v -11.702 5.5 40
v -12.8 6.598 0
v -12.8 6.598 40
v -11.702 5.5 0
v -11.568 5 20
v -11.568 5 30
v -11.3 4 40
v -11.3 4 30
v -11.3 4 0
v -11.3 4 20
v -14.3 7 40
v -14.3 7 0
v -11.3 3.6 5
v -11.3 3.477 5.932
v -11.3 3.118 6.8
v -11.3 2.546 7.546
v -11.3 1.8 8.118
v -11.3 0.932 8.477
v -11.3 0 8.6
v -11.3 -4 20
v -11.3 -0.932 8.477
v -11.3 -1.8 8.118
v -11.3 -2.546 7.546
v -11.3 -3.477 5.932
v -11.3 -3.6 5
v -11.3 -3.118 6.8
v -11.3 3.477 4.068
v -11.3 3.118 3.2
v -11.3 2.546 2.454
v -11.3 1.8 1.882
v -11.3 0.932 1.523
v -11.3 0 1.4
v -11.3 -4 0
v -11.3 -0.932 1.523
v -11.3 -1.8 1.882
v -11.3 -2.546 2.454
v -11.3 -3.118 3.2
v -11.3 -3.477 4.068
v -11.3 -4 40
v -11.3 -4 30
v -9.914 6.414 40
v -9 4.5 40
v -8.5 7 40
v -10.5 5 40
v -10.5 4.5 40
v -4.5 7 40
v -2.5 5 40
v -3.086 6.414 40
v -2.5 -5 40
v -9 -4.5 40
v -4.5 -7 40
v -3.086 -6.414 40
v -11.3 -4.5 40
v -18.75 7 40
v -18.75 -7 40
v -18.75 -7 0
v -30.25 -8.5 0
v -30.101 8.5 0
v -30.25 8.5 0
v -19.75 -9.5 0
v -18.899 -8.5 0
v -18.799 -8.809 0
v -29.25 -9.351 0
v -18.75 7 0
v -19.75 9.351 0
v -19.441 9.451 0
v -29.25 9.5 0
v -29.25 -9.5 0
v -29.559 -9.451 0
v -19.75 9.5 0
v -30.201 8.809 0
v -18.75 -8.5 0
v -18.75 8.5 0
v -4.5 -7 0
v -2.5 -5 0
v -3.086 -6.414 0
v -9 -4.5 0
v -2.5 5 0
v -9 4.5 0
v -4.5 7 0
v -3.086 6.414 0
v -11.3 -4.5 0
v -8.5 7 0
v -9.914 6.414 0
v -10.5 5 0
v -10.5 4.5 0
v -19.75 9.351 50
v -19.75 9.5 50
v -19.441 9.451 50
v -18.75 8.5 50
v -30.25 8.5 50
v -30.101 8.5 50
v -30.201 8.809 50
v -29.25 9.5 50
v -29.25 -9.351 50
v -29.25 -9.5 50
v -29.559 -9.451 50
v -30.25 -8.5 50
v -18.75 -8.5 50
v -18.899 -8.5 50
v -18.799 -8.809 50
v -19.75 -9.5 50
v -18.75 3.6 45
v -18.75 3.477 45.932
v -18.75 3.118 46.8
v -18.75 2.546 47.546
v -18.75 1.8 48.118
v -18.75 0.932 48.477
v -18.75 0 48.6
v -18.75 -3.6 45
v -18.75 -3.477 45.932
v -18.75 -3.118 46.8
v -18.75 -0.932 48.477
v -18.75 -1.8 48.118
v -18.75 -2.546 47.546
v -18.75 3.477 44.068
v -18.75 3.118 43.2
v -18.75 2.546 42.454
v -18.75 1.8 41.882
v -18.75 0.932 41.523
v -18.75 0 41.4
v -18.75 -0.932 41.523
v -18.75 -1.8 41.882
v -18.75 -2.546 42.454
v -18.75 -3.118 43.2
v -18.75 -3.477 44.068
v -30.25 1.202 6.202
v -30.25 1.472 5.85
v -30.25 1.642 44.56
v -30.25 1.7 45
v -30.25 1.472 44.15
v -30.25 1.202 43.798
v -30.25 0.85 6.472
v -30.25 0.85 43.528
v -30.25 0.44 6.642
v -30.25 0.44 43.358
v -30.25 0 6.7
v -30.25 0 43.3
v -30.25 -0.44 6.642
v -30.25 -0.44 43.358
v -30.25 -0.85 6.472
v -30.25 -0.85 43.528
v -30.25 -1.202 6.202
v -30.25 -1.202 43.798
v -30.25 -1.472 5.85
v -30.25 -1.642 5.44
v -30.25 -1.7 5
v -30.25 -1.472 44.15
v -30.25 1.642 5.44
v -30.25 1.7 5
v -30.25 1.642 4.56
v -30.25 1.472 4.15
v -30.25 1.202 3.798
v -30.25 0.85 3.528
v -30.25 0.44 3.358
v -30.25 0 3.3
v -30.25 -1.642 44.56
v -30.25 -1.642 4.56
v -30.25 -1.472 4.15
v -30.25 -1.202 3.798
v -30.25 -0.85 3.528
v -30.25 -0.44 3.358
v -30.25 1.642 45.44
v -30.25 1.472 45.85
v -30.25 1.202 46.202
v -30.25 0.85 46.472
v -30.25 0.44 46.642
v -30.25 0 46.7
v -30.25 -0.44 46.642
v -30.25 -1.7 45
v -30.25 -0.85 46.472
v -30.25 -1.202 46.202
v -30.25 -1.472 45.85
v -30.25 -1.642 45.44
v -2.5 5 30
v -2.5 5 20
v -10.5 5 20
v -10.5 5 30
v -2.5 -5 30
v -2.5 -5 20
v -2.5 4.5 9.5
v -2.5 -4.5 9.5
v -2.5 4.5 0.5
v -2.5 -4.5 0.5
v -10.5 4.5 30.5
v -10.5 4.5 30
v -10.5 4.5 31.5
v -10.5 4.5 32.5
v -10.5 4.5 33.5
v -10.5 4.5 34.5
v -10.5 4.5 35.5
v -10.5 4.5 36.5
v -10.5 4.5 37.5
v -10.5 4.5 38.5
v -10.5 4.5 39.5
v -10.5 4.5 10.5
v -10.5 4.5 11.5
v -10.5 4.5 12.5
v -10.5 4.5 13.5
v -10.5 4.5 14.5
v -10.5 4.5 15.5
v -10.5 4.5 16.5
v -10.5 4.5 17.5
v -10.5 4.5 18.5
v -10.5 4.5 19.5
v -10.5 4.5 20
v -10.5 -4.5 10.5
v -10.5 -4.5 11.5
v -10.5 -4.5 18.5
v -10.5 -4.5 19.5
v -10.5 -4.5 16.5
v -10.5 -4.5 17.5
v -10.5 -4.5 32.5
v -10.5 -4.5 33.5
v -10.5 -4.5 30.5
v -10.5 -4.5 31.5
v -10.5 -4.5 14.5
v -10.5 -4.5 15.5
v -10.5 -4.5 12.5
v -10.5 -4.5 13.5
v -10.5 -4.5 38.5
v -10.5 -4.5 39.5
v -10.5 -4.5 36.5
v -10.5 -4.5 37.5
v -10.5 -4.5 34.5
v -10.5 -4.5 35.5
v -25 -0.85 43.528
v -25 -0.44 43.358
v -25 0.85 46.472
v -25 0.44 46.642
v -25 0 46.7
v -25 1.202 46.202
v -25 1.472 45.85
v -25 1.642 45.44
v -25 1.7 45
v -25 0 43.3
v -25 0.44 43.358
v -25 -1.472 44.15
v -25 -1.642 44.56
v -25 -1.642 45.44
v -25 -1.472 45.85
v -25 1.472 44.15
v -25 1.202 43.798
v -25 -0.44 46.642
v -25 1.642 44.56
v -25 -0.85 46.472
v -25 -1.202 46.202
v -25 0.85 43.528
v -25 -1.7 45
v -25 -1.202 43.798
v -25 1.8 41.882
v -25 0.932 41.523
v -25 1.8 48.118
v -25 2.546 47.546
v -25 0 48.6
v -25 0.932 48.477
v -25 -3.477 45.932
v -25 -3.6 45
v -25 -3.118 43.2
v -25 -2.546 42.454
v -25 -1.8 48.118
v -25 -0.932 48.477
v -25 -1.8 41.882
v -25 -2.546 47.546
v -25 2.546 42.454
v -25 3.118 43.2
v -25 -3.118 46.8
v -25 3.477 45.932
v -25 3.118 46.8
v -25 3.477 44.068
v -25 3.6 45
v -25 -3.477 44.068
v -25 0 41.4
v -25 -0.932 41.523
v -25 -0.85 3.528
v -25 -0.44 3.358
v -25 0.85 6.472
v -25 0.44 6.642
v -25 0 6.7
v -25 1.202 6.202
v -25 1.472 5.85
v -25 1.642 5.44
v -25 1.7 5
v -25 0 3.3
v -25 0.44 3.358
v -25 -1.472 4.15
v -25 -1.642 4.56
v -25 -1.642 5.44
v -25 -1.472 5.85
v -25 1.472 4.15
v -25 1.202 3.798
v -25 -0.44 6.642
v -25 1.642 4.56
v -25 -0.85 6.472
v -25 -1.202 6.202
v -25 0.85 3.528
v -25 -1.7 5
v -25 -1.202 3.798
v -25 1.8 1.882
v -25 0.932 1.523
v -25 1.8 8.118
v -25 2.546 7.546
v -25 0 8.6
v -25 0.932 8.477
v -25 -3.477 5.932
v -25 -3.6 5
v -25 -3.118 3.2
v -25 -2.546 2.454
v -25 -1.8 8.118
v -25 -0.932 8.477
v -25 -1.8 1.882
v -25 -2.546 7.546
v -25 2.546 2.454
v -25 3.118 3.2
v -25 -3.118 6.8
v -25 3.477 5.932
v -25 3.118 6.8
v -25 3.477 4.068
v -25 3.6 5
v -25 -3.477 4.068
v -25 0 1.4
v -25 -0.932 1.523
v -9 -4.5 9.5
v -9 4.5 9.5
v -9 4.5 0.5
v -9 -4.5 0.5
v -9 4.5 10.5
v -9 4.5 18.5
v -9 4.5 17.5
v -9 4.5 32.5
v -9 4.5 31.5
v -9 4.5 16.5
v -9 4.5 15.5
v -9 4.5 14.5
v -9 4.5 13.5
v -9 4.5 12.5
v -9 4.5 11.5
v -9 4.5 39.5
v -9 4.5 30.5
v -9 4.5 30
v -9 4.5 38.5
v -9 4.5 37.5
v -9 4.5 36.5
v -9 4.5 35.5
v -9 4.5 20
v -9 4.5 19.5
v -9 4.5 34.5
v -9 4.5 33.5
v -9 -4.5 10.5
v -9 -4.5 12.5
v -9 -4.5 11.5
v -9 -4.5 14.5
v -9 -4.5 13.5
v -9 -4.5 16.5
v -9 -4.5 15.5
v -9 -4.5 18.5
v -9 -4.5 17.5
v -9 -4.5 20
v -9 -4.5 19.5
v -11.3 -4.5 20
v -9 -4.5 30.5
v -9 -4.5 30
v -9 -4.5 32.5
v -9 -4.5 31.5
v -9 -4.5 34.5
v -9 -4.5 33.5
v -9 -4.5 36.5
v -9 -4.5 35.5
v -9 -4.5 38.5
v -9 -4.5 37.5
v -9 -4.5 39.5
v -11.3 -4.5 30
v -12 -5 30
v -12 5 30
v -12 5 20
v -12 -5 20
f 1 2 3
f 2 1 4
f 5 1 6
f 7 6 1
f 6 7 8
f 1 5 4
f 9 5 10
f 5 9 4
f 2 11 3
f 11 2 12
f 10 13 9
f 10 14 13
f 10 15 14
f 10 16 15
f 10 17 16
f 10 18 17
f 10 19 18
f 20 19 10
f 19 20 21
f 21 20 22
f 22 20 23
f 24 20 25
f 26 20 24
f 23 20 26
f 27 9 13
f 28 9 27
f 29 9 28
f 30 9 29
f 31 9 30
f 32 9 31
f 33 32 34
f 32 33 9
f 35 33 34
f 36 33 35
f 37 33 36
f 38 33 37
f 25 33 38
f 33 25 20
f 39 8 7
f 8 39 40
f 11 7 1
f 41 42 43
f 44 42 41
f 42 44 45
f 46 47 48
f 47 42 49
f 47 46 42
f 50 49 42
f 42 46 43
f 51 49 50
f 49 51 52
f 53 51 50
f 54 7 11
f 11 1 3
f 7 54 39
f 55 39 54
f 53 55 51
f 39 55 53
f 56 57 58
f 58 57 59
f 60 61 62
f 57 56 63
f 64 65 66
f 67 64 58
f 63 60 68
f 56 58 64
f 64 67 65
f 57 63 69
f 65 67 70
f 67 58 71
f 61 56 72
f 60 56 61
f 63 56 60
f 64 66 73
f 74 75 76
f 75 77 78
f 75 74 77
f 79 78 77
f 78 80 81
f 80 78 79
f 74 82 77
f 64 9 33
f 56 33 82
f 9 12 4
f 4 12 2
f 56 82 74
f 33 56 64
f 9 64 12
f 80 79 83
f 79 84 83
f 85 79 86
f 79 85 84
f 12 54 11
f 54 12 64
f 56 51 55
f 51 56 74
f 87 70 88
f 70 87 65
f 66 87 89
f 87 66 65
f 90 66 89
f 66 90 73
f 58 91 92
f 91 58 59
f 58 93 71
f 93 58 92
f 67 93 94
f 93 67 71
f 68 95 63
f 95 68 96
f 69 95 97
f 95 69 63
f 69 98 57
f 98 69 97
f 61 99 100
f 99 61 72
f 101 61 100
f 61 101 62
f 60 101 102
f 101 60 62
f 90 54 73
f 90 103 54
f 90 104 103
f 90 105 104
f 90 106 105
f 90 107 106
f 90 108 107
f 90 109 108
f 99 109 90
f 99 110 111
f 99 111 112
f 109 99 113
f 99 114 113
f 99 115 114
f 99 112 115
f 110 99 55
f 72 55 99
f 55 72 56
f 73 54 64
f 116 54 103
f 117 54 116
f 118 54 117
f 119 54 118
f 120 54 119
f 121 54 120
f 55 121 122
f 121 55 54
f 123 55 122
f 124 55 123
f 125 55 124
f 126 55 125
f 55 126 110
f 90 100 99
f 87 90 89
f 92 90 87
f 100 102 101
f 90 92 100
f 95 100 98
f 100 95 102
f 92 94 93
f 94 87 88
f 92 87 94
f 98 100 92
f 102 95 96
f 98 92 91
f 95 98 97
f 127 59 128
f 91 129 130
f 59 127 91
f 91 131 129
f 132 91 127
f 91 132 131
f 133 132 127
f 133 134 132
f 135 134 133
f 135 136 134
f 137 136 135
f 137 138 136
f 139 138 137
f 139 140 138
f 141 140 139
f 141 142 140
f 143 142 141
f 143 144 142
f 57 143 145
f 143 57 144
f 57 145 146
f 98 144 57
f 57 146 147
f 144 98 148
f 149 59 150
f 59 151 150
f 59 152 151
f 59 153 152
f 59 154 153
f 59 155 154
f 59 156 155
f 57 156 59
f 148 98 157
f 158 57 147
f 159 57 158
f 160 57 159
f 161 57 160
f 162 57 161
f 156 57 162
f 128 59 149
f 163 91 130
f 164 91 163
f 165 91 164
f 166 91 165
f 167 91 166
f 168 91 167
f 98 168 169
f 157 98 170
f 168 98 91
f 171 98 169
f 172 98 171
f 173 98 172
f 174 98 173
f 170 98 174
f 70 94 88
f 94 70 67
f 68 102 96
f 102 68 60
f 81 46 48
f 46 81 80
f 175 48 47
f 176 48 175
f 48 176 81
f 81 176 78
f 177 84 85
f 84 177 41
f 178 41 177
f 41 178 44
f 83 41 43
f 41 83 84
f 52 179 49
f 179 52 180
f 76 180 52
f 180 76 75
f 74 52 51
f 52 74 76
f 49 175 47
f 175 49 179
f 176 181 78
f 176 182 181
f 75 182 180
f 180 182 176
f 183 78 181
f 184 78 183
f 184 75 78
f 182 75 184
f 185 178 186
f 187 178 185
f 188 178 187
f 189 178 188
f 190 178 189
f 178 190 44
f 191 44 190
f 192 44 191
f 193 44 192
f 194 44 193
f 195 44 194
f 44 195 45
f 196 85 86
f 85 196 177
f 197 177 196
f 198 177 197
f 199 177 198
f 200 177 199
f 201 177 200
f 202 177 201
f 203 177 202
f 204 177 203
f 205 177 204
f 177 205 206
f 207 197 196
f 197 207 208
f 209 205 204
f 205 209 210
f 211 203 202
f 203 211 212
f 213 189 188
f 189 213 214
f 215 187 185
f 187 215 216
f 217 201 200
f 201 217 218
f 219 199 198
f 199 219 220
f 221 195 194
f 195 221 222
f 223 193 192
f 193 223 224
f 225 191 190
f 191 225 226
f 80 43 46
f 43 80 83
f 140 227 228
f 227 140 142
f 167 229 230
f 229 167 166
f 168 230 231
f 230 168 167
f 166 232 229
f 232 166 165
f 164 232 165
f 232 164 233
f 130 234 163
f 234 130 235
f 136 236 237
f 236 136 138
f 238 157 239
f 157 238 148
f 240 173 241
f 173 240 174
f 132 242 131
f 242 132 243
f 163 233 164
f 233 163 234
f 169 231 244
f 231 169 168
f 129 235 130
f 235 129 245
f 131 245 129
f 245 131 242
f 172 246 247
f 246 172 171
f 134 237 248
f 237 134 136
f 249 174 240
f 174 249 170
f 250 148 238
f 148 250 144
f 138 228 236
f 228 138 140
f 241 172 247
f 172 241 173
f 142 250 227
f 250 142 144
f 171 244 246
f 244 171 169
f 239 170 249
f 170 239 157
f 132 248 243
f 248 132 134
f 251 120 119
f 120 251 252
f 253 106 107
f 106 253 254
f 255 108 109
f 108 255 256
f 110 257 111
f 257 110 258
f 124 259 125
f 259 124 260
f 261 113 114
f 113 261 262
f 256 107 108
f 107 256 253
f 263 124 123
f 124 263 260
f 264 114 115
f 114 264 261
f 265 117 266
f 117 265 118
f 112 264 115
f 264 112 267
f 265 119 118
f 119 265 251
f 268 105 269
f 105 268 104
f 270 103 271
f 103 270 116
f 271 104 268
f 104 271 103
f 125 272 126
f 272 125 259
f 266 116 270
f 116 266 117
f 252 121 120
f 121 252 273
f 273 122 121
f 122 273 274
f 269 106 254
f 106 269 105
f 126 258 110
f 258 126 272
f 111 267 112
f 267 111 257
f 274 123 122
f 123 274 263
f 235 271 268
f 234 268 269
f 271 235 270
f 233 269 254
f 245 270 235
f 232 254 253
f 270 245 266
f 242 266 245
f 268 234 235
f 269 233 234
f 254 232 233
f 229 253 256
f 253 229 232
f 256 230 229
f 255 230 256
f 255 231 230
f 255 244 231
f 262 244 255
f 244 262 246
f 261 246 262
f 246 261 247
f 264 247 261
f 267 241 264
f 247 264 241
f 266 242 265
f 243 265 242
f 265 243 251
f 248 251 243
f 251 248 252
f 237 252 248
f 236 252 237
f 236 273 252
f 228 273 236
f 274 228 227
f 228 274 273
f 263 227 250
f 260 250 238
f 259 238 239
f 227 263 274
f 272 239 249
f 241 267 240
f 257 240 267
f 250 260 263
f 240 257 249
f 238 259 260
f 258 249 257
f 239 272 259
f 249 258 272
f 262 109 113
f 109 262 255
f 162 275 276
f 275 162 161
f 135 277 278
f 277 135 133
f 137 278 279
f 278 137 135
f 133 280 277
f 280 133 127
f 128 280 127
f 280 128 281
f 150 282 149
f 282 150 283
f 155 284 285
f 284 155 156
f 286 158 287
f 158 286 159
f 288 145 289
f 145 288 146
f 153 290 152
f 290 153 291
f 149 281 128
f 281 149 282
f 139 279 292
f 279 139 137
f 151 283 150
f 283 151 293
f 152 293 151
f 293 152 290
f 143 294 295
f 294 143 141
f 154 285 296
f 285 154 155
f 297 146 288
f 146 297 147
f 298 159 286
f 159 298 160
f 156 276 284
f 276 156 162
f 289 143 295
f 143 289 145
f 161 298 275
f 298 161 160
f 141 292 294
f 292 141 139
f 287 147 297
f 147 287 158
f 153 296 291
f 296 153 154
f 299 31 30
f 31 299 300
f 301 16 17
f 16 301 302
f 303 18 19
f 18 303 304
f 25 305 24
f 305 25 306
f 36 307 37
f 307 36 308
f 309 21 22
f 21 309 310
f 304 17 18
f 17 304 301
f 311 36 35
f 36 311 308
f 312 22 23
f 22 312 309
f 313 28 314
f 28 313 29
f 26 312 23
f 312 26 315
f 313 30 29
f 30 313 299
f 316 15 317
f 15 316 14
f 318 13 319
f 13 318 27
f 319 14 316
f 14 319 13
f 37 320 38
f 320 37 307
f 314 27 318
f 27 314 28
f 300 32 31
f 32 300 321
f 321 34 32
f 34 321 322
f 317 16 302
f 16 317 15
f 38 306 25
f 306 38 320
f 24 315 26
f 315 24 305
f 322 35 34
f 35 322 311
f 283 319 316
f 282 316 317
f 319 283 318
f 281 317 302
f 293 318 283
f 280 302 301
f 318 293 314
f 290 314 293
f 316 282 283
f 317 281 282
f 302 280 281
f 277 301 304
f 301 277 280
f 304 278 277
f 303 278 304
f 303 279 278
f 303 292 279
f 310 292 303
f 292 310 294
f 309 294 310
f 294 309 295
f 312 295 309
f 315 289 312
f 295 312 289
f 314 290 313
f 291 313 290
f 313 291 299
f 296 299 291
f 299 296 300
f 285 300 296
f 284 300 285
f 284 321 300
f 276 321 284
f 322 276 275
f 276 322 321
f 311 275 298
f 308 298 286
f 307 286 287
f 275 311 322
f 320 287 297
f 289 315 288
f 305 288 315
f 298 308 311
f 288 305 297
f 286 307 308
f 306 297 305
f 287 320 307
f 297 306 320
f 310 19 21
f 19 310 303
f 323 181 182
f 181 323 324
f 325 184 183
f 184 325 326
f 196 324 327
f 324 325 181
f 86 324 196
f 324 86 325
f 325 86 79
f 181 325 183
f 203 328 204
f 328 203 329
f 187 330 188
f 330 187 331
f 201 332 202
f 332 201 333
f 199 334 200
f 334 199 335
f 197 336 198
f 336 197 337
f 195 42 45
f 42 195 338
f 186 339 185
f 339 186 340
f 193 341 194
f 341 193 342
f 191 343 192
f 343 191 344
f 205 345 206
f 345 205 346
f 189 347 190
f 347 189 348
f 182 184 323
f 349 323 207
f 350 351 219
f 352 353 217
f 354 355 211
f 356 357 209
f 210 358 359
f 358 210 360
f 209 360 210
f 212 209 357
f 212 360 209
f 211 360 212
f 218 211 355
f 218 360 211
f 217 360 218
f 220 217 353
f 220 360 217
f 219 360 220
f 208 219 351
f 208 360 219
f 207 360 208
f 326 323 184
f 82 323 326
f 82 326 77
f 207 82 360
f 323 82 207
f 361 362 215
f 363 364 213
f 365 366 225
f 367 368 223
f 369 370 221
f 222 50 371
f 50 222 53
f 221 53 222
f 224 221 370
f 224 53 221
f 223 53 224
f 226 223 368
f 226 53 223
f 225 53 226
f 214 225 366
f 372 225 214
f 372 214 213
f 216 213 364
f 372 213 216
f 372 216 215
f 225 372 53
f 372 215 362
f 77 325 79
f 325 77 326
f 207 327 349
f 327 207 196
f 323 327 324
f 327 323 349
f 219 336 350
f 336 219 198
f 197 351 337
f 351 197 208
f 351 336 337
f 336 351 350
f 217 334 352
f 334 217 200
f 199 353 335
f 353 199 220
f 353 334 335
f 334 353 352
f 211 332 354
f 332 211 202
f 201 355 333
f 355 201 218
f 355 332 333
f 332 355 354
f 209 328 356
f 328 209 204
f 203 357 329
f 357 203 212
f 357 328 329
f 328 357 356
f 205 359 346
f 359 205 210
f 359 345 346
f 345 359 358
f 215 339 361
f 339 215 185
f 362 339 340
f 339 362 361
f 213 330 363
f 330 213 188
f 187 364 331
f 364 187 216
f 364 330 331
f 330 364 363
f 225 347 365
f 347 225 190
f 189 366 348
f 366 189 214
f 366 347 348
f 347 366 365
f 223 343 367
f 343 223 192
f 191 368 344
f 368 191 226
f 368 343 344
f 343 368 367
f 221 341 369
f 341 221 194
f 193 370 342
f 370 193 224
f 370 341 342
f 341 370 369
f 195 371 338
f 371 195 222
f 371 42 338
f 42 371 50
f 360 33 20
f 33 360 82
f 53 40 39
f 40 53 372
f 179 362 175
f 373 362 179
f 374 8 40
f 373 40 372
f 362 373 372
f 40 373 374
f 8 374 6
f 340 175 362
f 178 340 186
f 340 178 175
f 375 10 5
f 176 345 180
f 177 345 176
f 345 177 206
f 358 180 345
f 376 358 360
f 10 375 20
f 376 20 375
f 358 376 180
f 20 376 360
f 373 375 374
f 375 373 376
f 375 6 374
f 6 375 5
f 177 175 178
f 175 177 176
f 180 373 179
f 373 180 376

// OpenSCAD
// file: functions.scad
// functions.scad
// all by Prusa

module belt(len, side = 0){
    //belt. To be substracted from model
    //len is in +Z, smooth side in +X, Y centered
    translate([-0.5, 0, 0]) maketeeth(len);
    translate([0, -4.5, -0.01]) cube([belt_thickness, 9, len + 0.02]);
    if (side != 0) {
    translate([0, -4.5 + side, -0.01]) cube_fillet([belt_thickness, 9, len + 0.02], vertical = [3, 0, 0, 0]);
    }
}

module maketeeth(len){
    //Belt teeth. 
    for (i = [0 : len / belt_tooth_distance]) {
        translate([0, 0, i * belt_tooth_distance]) cube([2, 9, belt_tooth_distance * belt_tooth_ratio], center = true);
    }
}
module plate_screw(long=0) {
        translate([0, 0, -long]) screw(head_drop=14 + long, h=30 + long, r_head=3.6, r=1.7, $fn=24, slant=false);
}
module screw(h=20, r=2, r_head=3.5, head_drop=0, slant=0, poly=false, $fn=0){
    //makes screw with head
    //for substraction as screw hole
    if (poly) {
        cylinder_poly(h=h, r=r, $fn=$fn);
    } else {
        cylinder(h=h, r=r, $fn=$fn);
    }
    if (slant) {
        translate([0, 0, head_drop-0.01]) cylinder(h=r_head, r2=0, r1=r_head, $fn=$fn);
    }

    if (head_drop > 0) {
        translate([0, 0, -0.01]) cylinder(h=head_drop+0.01, r=r_head, $fn=$fn);
    }
}
module nut(d,h,horizontal=true){
    cornerdiameter =  (d / 2) / cos (180 / 6);
    cylinder(h = h, r = cornerdiameter, $fn = 6);
    if(horizontal){
        for(i = [1:6]){
            rotate([0,0,60*i]) translate([-cornerdiameter-0.2,0,0]) rotate([0,0,-45]) cube([2,2,h]);
        }
    }
}

module fillet(radius, height=100, $fn=0) {
    //this creates acutal fillet
    translate([-radius, -radius, -height / 2 - 0.02]) difference() {
        cube([radius * 2, radius * 2, height + 0.04]);
        if ($fn == 0 && (radius == 2 || radius == 3 || radius == 4)) {
            cylinder(r=radius, h=height + 0.04, $fn=4 * radius);
        } else {
            cylinder(r=radius, h=height + 0.04, $fn=$fn);
        }

    }
}

module cube_fillet(size, radius=-1, vertical=[3,3,3,3], top=[0,0,0,0], bottom=[0,0,0,0], center=false, $fn=0){
    //
    if (use_fillets == 1) {
        if (center) {
            cube_fillet_inside(size, radius, vertical, top, bottom, $fn);
        } else {
            translate([size[0]/2, size[1]/2, size[2]/2])
                cube_fillet_inside(size, radius, vertical, top, bottom, $fn);
        }
    } else {
        if (use_fillets == 2) {
            if (center) {
                cube_fillet_inside(size, radius, vertical, top, bottom, 4);
            } else {
                translate([size[0]/2, size[1]/2, size[2]/2])
                    cube_fillet_inside(size, radius, vertical, top, bottom, 4);
            }

        } else {
            cube(size, center);
        }
    }

}

module cube_negative_fillet(size, radius=-1, vertical=[3,3,3,3], top=[0,0,0,0], bottom=[0,0,0,0], $fn=0){

    j=[1,0,1,0];

    for (i=[0:3]) {
        if (radius > -1) {
            rotate([0, 0, 90*i]) translate([size[1-j[i]]/2, size[j[i]]/2, 0]) fillet(radius, size[2], $fn=$fn);
        } else {
            rotate([0, 0, 90*i]) translate([size[1-j[i]]/2, size[j[i]]/2, 0]) fillet(vertical[i], size[2], $fn=$fn);
        }
        rotate([90*i, -90, 0]) translate([size[2]/2, size[j[i]]/2, 0 ]) fillet(top[i], size[1-j[i]], $fn=$fn);
        rotate([90*(4-i), 90, 0]) translate([size[2]/2, size[j[i]]/2, 0]) fillet(bottom[i], size[1-j[i]], $fn=$fn);

    }
}

module cube_fillet_inside(size, radius=-1, vertical=[3,3,3,3], top=[0,0,0,0], bottom=[0,0,0,0], $fn=0){
    //makes CENTERED cube with round corners
    // if you give it radius, it will fillet vertical corners.
    //othervise use vertical, top, bottom arrays
    //when viewed from top, it starts in upper right corner (+x,+y quadrant) , goes counterclockwise
    //top/bottom fillet starts in direction of Y axis and goes CCW too


    if (radius == 0) {
        cube(size, center=true);
    } else {
        difference() {
            cube(size, center=true);
            cube_negative_fillet(size, radius, vertical, top, bottom, $fn);
        }
    }
}
// file: configuration.scad
smooth_rod_d      = 8;
threaded_rod_d    = 10;
tie_wrap_w        = 5;
tie_wrap_t        = 2;
washer_d          = 21;
height_of_threaded = 26.5;
height_of_smooth = height_of_threaded + 11 + 9;
height_of_post = height_of_smooth+2;

belt_width = 6.5;
belt_tooth_distance = 2;
belt_tooth_ratio = 0.5;
belt_thickness = 0.8;
// main file
// Y belt holder
// GNU GPL v3
// Josef Průša <josefprusa@me.com>
// Václav 'ax' Hůla <axtheb@gmail.com>
// Alterations for reprap Wilson by Martin Rice <mrice411@gmail.com>
// (this is exactly like the box-frame Y belt holder)

include <configuration.scad>
include <functions.scad>

use_fillets = 1;
extratallness = 0;

module y_belt_holder(len=40) {
    y_delta = -2.5;
    ybelt_hole_to_side = 5;
    real_len = len + 2 * ybelt_hole_to_side;
    screw_hole_z_offset = 0;
    
    difference(){
        union(){

            translate([-21 - belt_thickness, -7, 0]) cube_fillet([13 + y_delta, 14, len], vertical=[3,0,0,0], fn=8 );
            translate([-14, -5.5, len / 2])          cube_fillet([24 + 2 * y_delta, 3, len], vertical=[3, 0, 0, 0], center = true);
            translate([-24.5-extratallness/2, 0, real_len / 2])      cube_fillet([11.5+extratallness, 16+3, real_len], center = true, vertical = [1, 1, 1, 1], $fn=16);
            translate([-4.0 + y_delta, 0, len / 2])  cube_fillet([8, 14, len], center = true, vertical = [2,2,0,2]);

        }
        translate([-4.5 + y_delta, 0, real_len / 2]) cube([10, 10, 10], center = true);
        translate([-11, 0, ybelt_hole_to_side + len]) {
            translate([screw_hole_z_offset,0,0]) rotate([0, -90, 0]) plate_screw(20);
            translate([8 + y_delta, 0, 0]) cube([10, 9, 9], center=true);
        }
        translate([-11, 0, ybelt_hole_to_side]) {
            translate([screw_hole_z_offset,0,0]) rotate([0, -90, 0]) plate_screw(20);
            translate([8 + y_delta, 0, 0]) cube([10, 9, 9], center=true);
        }

        translate([-8 + y_delta, 0, 0]) mirror([1, 0, 0]) belt(real_len);
    }
}


y_belt_holder();
